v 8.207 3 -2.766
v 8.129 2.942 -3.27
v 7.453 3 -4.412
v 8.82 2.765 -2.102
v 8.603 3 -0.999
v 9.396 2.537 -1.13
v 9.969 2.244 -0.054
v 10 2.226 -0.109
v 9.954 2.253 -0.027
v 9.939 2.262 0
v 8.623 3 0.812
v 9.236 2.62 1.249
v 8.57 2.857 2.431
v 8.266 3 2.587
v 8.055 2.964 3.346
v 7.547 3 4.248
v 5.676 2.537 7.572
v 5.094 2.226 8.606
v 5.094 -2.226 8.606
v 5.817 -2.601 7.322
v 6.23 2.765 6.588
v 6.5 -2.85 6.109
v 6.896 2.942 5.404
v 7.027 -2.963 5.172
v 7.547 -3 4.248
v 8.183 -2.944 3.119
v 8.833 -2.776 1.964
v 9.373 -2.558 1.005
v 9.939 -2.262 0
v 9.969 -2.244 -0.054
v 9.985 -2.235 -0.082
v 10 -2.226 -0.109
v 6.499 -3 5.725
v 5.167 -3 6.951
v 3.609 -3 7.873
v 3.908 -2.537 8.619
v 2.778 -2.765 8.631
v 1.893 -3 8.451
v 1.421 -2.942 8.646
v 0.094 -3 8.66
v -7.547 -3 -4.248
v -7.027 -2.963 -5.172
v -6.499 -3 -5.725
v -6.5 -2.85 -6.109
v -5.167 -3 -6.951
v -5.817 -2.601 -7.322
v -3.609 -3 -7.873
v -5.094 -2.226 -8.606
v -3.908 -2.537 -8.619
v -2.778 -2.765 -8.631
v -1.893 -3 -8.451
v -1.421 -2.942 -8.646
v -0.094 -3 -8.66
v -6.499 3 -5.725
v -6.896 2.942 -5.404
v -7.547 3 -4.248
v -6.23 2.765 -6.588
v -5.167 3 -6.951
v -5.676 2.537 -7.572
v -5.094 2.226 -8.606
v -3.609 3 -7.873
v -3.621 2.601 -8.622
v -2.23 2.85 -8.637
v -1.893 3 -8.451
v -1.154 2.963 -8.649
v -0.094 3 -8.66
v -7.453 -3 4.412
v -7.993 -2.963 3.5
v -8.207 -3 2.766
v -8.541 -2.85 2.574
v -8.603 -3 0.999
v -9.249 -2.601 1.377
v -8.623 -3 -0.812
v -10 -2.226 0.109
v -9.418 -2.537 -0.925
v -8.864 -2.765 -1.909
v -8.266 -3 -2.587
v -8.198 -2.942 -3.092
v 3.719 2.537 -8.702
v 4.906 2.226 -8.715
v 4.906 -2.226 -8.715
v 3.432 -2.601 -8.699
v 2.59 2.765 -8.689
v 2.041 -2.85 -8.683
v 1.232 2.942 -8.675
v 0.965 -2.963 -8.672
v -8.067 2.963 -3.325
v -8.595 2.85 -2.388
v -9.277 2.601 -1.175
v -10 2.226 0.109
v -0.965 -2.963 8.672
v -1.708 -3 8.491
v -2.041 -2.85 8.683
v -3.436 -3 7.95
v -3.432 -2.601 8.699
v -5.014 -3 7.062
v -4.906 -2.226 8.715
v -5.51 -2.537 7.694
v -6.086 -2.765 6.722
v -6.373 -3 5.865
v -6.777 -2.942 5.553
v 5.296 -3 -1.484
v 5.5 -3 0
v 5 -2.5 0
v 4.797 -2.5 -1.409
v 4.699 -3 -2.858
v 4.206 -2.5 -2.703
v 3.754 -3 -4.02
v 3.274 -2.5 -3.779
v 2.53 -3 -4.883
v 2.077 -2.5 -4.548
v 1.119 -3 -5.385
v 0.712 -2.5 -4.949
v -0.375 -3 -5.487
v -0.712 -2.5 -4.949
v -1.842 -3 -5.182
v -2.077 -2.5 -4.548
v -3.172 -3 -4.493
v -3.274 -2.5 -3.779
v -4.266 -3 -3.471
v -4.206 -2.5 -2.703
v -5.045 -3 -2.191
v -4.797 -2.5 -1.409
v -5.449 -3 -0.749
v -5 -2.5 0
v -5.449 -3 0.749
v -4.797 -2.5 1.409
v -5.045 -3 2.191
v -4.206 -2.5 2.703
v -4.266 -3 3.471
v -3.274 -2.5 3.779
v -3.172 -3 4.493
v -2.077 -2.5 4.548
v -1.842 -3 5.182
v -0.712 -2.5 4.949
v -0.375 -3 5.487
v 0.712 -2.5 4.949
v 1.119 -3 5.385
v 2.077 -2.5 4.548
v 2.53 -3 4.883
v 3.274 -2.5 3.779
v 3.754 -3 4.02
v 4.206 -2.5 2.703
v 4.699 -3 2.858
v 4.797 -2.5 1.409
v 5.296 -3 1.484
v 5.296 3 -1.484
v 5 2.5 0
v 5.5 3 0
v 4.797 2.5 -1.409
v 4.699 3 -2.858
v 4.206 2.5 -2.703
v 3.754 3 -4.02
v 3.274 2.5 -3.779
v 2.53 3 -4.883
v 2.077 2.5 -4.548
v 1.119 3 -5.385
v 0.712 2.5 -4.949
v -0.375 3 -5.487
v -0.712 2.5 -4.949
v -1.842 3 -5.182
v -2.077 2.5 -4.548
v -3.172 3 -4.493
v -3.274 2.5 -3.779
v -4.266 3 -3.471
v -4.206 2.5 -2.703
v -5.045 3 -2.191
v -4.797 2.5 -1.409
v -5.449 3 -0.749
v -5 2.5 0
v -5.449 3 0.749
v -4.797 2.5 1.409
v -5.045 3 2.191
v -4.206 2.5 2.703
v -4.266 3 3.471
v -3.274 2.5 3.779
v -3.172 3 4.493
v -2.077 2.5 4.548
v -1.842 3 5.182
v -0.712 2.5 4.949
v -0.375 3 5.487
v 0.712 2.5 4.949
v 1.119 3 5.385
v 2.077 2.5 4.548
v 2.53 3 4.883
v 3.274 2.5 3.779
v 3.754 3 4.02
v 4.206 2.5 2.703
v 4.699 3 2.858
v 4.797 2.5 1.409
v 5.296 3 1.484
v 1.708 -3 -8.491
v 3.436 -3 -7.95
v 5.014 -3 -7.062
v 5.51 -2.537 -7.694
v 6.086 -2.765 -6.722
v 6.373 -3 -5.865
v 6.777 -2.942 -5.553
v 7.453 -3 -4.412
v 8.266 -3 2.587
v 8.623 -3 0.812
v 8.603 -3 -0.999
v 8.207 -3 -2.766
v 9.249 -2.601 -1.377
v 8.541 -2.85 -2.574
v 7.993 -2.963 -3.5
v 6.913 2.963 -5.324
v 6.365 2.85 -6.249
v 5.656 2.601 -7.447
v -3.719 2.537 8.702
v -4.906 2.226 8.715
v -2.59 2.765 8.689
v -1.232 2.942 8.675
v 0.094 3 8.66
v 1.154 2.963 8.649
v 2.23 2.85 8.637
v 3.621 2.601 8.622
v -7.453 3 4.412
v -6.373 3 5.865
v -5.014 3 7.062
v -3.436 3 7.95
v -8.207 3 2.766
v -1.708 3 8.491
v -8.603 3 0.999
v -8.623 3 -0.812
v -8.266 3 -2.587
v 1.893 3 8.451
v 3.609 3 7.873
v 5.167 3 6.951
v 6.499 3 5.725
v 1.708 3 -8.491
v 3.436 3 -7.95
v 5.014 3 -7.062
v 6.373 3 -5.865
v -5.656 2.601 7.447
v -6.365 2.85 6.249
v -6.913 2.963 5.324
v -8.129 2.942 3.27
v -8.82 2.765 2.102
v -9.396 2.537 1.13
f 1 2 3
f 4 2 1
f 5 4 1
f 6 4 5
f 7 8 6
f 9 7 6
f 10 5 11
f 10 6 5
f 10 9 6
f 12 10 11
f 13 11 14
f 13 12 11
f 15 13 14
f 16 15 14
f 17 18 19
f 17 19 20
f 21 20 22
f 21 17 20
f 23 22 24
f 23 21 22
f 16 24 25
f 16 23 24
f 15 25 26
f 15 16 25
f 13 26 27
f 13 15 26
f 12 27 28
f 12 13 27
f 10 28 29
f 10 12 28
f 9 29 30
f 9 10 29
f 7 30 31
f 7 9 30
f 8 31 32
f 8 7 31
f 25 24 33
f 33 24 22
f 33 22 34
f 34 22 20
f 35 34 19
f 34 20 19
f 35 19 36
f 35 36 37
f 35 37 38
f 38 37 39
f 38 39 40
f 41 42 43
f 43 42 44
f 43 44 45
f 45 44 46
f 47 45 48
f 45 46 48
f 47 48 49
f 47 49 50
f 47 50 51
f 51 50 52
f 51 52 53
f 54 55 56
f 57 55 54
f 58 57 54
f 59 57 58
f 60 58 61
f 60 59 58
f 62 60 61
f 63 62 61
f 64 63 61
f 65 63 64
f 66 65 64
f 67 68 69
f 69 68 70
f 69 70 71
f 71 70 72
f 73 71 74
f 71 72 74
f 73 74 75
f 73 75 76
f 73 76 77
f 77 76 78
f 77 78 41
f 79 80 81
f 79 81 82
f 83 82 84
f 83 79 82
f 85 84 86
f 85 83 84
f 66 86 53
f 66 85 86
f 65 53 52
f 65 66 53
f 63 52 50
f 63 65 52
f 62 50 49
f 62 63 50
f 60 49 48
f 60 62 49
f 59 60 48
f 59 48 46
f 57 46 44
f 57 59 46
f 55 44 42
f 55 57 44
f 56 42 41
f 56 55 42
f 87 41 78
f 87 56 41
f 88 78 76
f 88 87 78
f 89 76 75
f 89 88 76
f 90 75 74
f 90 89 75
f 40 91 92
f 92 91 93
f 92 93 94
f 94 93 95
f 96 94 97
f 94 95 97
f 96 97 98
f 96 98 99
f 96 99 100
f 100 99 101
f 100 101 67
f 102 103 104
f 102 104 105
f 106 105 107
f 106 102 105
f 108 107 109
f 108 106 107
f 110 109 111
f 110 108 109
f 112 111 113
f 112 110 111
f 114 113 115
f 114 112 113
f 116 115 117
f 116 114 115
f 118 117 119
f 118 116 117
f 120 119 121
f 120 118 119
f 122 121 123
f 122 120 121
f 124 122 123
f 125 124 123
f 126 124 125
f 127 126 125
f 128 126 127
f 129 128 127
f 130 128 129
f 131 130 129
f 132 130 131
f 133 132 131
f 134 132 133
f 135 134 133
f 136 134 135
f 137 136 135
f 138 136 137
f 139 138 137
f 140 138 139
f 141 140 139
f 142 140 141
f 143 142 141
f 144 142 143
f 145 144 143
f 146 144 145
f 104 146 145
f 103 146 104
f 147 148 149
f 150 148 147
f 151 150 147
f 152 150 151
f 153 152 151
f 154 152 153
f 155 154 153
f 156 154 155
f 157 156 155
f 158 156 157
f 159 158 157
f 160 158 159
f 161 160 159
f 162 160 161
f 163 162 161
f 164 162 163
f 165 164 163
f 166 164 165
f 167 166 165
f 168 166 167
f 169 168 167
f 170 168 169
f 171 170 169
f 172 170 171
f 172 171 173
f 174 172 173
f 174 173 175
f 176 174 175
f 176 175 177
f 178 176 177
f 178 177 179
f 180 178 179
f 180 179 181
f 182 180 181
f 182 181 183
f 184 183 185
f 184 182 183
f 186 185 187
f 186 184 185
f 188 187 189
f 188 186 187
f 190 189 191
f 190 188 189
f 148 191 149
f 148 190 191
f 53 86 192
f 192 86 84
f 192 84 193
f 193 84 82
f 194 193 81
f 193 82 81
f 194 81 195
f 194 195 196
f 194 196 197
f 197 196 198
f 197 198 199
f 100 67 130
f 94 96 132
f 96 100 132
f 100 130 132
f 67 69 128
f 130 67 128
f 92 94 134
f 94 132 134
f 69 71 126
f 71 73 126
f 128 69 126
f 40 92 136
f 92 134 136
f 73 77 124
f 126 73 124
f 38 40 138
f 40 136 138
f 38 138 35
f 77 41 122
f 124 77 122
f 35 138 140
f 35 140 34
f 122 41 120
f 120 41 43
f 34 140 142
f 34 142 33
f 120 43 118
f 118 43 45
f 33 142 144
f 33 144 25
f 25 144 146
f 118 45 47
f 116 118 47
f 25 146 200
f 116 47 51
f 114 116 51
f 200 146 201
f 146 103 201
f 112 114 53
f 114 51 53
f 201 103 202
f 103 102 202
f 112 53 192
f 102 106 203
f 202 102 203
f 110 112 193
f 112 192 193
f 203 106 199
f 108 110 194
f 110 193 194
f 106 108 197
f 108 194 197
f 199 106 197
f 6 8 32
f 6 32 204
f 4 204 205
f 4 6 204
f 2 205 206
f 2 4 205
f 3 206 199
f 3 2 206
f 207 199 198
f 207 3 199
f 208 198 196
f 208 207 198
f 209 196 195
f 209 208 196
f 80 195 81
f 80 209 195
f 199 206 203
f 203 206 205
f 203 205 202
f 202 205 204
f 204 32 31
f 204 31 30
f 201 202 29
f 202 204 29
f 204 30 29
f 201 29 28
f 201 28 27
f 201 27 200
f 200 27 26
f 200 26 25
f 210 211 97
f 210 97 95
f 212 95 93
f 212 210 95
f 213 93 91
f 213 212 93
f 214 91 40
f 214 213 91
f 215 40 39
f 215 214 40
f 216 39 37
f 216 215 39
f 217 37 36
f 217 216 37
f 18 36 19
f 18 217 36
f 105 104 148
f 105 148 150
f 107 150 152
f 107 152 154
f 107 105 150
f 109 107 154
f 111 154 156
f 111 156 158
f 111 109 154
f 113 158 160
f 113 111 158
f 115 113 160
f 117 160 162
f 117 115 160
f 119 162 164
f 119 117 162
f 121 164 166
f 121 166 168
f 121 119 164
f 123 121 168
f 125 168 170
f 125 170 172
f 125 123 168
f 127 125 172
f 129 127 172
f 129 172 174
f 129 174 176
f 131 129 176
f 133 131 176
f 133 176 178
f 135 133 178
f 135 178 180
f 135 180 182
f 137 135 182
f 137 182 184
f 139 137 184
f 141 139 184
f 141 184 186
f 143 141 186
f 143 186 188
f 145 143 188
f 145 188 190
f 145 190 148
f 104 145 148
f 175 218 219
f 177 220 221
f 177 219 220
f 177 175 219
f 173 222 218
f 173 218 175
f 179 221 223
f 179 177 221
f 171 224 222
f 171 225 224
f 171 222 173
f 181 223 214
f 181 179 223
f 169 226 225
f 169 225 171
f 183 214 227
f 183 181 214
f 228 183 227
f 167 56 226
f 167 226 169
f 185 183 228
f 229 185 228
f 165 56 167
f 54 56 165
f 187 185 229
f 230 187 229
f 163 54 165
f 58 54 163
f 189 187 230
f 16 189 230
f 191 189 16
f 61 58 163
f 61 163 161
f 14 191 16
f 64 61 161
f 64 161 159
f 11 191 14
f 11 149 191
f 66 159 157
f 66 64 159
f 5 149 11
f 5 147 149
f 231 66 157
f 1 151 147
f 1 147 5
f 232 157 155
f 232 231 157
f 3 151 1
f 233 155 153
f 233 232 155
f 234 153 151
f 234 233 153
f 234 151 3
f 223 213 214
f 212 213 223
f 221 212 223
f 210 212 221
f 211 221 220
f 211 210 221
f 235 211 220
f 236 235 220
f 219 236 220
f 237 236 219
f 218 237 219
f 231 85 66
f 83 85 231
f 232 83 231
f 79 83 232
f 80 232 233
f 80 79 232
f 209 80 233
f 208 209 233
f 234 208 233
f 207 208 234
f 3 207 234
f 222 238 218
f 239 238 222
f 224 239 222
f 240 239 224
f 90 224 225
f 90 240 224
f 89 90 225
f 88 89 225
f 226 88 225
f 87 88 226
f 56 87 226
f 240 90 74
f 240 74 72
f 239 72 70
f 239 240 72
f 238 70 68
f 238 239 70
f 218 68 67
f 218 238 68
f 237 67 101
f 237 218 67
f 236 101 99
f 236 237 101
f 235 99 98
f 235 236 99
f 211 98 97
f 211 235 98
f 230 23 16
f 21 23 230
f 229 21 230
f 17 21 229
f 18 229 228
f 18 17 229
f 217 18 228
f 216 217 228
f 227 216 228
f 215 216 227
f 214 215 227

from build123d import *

# Parameters (mm, degrees)
SKETCH1_R           = 5
BOSS_EXTRUDE1_DEPTH = 3
CHAMFER1_SIZE       = 0.5
SKETCH2_OUTSIDE_W   = 62.08
SKETCH2_OUTSIDE_H   = 59.51
SKETCH2_OUTSIDE_R   = 8.660766964
CUT_EXTRUDE1_DEPTH  = 10
CUT_EXTRUDE1_TAPER  = 60


with BuildPart() as part:
    # Sketch1 → Boss-Extrude1 (new body, symmetric)
    with BuildSketch(Plane(origin=(0, 0, 0), x_dir=(1, 0, 0), z_dir=(0, 1, 0))):
        Polygon((-4.905742916, -8.714673391), (5.094257084, -8.605834685), (10, 0.108838706), (4.905742916, 8.714673391), (-5.094257084, 8.605834685), (-10, -0.108838706), align=None)
        Circle(SKETCH1_R, mode=Mode.SUBTRACT)
    extrude(amount=BOSS_EXTRUDE1_DEPTH, both=True)

    # Chamfer1
    chamfer1_edges = [part.edges().sort_by_distance(p)[0] for p in [
        (-5, -3, 0),
        (-5, 3, 0),
    ]]
    chamfer(chamfer1_edges, length=CHAMFER1_SIZE)

    # Sketch2 outside → Cut-Extrude1 (cut)
    with BuildSketch(Plane(origin=(0, 3, 0), x_dir=(1, 0, 0), z_dir=(0, 1, 0))):
        Rectangle(SKETCH2_OUTSIDE_W, SKETCH2_OUTSIDE_H)
        Circle(SKETCH2_OUTSIDE_R, mode=Mode.SUBTRACT)
    cut_extrude1 = extrude(amount=-CUT_EXTRUDE1_DEPTH, taper=CUT_EXTRUDE1_TAPER, mode=Mode.SUBTRACT)

    # Mirror1: Cut-Extrude1 across plane
    add(cut_extrude1.mirror(Plane.ZX), mode=Mode.SUBTRACT)


solid = part.part
